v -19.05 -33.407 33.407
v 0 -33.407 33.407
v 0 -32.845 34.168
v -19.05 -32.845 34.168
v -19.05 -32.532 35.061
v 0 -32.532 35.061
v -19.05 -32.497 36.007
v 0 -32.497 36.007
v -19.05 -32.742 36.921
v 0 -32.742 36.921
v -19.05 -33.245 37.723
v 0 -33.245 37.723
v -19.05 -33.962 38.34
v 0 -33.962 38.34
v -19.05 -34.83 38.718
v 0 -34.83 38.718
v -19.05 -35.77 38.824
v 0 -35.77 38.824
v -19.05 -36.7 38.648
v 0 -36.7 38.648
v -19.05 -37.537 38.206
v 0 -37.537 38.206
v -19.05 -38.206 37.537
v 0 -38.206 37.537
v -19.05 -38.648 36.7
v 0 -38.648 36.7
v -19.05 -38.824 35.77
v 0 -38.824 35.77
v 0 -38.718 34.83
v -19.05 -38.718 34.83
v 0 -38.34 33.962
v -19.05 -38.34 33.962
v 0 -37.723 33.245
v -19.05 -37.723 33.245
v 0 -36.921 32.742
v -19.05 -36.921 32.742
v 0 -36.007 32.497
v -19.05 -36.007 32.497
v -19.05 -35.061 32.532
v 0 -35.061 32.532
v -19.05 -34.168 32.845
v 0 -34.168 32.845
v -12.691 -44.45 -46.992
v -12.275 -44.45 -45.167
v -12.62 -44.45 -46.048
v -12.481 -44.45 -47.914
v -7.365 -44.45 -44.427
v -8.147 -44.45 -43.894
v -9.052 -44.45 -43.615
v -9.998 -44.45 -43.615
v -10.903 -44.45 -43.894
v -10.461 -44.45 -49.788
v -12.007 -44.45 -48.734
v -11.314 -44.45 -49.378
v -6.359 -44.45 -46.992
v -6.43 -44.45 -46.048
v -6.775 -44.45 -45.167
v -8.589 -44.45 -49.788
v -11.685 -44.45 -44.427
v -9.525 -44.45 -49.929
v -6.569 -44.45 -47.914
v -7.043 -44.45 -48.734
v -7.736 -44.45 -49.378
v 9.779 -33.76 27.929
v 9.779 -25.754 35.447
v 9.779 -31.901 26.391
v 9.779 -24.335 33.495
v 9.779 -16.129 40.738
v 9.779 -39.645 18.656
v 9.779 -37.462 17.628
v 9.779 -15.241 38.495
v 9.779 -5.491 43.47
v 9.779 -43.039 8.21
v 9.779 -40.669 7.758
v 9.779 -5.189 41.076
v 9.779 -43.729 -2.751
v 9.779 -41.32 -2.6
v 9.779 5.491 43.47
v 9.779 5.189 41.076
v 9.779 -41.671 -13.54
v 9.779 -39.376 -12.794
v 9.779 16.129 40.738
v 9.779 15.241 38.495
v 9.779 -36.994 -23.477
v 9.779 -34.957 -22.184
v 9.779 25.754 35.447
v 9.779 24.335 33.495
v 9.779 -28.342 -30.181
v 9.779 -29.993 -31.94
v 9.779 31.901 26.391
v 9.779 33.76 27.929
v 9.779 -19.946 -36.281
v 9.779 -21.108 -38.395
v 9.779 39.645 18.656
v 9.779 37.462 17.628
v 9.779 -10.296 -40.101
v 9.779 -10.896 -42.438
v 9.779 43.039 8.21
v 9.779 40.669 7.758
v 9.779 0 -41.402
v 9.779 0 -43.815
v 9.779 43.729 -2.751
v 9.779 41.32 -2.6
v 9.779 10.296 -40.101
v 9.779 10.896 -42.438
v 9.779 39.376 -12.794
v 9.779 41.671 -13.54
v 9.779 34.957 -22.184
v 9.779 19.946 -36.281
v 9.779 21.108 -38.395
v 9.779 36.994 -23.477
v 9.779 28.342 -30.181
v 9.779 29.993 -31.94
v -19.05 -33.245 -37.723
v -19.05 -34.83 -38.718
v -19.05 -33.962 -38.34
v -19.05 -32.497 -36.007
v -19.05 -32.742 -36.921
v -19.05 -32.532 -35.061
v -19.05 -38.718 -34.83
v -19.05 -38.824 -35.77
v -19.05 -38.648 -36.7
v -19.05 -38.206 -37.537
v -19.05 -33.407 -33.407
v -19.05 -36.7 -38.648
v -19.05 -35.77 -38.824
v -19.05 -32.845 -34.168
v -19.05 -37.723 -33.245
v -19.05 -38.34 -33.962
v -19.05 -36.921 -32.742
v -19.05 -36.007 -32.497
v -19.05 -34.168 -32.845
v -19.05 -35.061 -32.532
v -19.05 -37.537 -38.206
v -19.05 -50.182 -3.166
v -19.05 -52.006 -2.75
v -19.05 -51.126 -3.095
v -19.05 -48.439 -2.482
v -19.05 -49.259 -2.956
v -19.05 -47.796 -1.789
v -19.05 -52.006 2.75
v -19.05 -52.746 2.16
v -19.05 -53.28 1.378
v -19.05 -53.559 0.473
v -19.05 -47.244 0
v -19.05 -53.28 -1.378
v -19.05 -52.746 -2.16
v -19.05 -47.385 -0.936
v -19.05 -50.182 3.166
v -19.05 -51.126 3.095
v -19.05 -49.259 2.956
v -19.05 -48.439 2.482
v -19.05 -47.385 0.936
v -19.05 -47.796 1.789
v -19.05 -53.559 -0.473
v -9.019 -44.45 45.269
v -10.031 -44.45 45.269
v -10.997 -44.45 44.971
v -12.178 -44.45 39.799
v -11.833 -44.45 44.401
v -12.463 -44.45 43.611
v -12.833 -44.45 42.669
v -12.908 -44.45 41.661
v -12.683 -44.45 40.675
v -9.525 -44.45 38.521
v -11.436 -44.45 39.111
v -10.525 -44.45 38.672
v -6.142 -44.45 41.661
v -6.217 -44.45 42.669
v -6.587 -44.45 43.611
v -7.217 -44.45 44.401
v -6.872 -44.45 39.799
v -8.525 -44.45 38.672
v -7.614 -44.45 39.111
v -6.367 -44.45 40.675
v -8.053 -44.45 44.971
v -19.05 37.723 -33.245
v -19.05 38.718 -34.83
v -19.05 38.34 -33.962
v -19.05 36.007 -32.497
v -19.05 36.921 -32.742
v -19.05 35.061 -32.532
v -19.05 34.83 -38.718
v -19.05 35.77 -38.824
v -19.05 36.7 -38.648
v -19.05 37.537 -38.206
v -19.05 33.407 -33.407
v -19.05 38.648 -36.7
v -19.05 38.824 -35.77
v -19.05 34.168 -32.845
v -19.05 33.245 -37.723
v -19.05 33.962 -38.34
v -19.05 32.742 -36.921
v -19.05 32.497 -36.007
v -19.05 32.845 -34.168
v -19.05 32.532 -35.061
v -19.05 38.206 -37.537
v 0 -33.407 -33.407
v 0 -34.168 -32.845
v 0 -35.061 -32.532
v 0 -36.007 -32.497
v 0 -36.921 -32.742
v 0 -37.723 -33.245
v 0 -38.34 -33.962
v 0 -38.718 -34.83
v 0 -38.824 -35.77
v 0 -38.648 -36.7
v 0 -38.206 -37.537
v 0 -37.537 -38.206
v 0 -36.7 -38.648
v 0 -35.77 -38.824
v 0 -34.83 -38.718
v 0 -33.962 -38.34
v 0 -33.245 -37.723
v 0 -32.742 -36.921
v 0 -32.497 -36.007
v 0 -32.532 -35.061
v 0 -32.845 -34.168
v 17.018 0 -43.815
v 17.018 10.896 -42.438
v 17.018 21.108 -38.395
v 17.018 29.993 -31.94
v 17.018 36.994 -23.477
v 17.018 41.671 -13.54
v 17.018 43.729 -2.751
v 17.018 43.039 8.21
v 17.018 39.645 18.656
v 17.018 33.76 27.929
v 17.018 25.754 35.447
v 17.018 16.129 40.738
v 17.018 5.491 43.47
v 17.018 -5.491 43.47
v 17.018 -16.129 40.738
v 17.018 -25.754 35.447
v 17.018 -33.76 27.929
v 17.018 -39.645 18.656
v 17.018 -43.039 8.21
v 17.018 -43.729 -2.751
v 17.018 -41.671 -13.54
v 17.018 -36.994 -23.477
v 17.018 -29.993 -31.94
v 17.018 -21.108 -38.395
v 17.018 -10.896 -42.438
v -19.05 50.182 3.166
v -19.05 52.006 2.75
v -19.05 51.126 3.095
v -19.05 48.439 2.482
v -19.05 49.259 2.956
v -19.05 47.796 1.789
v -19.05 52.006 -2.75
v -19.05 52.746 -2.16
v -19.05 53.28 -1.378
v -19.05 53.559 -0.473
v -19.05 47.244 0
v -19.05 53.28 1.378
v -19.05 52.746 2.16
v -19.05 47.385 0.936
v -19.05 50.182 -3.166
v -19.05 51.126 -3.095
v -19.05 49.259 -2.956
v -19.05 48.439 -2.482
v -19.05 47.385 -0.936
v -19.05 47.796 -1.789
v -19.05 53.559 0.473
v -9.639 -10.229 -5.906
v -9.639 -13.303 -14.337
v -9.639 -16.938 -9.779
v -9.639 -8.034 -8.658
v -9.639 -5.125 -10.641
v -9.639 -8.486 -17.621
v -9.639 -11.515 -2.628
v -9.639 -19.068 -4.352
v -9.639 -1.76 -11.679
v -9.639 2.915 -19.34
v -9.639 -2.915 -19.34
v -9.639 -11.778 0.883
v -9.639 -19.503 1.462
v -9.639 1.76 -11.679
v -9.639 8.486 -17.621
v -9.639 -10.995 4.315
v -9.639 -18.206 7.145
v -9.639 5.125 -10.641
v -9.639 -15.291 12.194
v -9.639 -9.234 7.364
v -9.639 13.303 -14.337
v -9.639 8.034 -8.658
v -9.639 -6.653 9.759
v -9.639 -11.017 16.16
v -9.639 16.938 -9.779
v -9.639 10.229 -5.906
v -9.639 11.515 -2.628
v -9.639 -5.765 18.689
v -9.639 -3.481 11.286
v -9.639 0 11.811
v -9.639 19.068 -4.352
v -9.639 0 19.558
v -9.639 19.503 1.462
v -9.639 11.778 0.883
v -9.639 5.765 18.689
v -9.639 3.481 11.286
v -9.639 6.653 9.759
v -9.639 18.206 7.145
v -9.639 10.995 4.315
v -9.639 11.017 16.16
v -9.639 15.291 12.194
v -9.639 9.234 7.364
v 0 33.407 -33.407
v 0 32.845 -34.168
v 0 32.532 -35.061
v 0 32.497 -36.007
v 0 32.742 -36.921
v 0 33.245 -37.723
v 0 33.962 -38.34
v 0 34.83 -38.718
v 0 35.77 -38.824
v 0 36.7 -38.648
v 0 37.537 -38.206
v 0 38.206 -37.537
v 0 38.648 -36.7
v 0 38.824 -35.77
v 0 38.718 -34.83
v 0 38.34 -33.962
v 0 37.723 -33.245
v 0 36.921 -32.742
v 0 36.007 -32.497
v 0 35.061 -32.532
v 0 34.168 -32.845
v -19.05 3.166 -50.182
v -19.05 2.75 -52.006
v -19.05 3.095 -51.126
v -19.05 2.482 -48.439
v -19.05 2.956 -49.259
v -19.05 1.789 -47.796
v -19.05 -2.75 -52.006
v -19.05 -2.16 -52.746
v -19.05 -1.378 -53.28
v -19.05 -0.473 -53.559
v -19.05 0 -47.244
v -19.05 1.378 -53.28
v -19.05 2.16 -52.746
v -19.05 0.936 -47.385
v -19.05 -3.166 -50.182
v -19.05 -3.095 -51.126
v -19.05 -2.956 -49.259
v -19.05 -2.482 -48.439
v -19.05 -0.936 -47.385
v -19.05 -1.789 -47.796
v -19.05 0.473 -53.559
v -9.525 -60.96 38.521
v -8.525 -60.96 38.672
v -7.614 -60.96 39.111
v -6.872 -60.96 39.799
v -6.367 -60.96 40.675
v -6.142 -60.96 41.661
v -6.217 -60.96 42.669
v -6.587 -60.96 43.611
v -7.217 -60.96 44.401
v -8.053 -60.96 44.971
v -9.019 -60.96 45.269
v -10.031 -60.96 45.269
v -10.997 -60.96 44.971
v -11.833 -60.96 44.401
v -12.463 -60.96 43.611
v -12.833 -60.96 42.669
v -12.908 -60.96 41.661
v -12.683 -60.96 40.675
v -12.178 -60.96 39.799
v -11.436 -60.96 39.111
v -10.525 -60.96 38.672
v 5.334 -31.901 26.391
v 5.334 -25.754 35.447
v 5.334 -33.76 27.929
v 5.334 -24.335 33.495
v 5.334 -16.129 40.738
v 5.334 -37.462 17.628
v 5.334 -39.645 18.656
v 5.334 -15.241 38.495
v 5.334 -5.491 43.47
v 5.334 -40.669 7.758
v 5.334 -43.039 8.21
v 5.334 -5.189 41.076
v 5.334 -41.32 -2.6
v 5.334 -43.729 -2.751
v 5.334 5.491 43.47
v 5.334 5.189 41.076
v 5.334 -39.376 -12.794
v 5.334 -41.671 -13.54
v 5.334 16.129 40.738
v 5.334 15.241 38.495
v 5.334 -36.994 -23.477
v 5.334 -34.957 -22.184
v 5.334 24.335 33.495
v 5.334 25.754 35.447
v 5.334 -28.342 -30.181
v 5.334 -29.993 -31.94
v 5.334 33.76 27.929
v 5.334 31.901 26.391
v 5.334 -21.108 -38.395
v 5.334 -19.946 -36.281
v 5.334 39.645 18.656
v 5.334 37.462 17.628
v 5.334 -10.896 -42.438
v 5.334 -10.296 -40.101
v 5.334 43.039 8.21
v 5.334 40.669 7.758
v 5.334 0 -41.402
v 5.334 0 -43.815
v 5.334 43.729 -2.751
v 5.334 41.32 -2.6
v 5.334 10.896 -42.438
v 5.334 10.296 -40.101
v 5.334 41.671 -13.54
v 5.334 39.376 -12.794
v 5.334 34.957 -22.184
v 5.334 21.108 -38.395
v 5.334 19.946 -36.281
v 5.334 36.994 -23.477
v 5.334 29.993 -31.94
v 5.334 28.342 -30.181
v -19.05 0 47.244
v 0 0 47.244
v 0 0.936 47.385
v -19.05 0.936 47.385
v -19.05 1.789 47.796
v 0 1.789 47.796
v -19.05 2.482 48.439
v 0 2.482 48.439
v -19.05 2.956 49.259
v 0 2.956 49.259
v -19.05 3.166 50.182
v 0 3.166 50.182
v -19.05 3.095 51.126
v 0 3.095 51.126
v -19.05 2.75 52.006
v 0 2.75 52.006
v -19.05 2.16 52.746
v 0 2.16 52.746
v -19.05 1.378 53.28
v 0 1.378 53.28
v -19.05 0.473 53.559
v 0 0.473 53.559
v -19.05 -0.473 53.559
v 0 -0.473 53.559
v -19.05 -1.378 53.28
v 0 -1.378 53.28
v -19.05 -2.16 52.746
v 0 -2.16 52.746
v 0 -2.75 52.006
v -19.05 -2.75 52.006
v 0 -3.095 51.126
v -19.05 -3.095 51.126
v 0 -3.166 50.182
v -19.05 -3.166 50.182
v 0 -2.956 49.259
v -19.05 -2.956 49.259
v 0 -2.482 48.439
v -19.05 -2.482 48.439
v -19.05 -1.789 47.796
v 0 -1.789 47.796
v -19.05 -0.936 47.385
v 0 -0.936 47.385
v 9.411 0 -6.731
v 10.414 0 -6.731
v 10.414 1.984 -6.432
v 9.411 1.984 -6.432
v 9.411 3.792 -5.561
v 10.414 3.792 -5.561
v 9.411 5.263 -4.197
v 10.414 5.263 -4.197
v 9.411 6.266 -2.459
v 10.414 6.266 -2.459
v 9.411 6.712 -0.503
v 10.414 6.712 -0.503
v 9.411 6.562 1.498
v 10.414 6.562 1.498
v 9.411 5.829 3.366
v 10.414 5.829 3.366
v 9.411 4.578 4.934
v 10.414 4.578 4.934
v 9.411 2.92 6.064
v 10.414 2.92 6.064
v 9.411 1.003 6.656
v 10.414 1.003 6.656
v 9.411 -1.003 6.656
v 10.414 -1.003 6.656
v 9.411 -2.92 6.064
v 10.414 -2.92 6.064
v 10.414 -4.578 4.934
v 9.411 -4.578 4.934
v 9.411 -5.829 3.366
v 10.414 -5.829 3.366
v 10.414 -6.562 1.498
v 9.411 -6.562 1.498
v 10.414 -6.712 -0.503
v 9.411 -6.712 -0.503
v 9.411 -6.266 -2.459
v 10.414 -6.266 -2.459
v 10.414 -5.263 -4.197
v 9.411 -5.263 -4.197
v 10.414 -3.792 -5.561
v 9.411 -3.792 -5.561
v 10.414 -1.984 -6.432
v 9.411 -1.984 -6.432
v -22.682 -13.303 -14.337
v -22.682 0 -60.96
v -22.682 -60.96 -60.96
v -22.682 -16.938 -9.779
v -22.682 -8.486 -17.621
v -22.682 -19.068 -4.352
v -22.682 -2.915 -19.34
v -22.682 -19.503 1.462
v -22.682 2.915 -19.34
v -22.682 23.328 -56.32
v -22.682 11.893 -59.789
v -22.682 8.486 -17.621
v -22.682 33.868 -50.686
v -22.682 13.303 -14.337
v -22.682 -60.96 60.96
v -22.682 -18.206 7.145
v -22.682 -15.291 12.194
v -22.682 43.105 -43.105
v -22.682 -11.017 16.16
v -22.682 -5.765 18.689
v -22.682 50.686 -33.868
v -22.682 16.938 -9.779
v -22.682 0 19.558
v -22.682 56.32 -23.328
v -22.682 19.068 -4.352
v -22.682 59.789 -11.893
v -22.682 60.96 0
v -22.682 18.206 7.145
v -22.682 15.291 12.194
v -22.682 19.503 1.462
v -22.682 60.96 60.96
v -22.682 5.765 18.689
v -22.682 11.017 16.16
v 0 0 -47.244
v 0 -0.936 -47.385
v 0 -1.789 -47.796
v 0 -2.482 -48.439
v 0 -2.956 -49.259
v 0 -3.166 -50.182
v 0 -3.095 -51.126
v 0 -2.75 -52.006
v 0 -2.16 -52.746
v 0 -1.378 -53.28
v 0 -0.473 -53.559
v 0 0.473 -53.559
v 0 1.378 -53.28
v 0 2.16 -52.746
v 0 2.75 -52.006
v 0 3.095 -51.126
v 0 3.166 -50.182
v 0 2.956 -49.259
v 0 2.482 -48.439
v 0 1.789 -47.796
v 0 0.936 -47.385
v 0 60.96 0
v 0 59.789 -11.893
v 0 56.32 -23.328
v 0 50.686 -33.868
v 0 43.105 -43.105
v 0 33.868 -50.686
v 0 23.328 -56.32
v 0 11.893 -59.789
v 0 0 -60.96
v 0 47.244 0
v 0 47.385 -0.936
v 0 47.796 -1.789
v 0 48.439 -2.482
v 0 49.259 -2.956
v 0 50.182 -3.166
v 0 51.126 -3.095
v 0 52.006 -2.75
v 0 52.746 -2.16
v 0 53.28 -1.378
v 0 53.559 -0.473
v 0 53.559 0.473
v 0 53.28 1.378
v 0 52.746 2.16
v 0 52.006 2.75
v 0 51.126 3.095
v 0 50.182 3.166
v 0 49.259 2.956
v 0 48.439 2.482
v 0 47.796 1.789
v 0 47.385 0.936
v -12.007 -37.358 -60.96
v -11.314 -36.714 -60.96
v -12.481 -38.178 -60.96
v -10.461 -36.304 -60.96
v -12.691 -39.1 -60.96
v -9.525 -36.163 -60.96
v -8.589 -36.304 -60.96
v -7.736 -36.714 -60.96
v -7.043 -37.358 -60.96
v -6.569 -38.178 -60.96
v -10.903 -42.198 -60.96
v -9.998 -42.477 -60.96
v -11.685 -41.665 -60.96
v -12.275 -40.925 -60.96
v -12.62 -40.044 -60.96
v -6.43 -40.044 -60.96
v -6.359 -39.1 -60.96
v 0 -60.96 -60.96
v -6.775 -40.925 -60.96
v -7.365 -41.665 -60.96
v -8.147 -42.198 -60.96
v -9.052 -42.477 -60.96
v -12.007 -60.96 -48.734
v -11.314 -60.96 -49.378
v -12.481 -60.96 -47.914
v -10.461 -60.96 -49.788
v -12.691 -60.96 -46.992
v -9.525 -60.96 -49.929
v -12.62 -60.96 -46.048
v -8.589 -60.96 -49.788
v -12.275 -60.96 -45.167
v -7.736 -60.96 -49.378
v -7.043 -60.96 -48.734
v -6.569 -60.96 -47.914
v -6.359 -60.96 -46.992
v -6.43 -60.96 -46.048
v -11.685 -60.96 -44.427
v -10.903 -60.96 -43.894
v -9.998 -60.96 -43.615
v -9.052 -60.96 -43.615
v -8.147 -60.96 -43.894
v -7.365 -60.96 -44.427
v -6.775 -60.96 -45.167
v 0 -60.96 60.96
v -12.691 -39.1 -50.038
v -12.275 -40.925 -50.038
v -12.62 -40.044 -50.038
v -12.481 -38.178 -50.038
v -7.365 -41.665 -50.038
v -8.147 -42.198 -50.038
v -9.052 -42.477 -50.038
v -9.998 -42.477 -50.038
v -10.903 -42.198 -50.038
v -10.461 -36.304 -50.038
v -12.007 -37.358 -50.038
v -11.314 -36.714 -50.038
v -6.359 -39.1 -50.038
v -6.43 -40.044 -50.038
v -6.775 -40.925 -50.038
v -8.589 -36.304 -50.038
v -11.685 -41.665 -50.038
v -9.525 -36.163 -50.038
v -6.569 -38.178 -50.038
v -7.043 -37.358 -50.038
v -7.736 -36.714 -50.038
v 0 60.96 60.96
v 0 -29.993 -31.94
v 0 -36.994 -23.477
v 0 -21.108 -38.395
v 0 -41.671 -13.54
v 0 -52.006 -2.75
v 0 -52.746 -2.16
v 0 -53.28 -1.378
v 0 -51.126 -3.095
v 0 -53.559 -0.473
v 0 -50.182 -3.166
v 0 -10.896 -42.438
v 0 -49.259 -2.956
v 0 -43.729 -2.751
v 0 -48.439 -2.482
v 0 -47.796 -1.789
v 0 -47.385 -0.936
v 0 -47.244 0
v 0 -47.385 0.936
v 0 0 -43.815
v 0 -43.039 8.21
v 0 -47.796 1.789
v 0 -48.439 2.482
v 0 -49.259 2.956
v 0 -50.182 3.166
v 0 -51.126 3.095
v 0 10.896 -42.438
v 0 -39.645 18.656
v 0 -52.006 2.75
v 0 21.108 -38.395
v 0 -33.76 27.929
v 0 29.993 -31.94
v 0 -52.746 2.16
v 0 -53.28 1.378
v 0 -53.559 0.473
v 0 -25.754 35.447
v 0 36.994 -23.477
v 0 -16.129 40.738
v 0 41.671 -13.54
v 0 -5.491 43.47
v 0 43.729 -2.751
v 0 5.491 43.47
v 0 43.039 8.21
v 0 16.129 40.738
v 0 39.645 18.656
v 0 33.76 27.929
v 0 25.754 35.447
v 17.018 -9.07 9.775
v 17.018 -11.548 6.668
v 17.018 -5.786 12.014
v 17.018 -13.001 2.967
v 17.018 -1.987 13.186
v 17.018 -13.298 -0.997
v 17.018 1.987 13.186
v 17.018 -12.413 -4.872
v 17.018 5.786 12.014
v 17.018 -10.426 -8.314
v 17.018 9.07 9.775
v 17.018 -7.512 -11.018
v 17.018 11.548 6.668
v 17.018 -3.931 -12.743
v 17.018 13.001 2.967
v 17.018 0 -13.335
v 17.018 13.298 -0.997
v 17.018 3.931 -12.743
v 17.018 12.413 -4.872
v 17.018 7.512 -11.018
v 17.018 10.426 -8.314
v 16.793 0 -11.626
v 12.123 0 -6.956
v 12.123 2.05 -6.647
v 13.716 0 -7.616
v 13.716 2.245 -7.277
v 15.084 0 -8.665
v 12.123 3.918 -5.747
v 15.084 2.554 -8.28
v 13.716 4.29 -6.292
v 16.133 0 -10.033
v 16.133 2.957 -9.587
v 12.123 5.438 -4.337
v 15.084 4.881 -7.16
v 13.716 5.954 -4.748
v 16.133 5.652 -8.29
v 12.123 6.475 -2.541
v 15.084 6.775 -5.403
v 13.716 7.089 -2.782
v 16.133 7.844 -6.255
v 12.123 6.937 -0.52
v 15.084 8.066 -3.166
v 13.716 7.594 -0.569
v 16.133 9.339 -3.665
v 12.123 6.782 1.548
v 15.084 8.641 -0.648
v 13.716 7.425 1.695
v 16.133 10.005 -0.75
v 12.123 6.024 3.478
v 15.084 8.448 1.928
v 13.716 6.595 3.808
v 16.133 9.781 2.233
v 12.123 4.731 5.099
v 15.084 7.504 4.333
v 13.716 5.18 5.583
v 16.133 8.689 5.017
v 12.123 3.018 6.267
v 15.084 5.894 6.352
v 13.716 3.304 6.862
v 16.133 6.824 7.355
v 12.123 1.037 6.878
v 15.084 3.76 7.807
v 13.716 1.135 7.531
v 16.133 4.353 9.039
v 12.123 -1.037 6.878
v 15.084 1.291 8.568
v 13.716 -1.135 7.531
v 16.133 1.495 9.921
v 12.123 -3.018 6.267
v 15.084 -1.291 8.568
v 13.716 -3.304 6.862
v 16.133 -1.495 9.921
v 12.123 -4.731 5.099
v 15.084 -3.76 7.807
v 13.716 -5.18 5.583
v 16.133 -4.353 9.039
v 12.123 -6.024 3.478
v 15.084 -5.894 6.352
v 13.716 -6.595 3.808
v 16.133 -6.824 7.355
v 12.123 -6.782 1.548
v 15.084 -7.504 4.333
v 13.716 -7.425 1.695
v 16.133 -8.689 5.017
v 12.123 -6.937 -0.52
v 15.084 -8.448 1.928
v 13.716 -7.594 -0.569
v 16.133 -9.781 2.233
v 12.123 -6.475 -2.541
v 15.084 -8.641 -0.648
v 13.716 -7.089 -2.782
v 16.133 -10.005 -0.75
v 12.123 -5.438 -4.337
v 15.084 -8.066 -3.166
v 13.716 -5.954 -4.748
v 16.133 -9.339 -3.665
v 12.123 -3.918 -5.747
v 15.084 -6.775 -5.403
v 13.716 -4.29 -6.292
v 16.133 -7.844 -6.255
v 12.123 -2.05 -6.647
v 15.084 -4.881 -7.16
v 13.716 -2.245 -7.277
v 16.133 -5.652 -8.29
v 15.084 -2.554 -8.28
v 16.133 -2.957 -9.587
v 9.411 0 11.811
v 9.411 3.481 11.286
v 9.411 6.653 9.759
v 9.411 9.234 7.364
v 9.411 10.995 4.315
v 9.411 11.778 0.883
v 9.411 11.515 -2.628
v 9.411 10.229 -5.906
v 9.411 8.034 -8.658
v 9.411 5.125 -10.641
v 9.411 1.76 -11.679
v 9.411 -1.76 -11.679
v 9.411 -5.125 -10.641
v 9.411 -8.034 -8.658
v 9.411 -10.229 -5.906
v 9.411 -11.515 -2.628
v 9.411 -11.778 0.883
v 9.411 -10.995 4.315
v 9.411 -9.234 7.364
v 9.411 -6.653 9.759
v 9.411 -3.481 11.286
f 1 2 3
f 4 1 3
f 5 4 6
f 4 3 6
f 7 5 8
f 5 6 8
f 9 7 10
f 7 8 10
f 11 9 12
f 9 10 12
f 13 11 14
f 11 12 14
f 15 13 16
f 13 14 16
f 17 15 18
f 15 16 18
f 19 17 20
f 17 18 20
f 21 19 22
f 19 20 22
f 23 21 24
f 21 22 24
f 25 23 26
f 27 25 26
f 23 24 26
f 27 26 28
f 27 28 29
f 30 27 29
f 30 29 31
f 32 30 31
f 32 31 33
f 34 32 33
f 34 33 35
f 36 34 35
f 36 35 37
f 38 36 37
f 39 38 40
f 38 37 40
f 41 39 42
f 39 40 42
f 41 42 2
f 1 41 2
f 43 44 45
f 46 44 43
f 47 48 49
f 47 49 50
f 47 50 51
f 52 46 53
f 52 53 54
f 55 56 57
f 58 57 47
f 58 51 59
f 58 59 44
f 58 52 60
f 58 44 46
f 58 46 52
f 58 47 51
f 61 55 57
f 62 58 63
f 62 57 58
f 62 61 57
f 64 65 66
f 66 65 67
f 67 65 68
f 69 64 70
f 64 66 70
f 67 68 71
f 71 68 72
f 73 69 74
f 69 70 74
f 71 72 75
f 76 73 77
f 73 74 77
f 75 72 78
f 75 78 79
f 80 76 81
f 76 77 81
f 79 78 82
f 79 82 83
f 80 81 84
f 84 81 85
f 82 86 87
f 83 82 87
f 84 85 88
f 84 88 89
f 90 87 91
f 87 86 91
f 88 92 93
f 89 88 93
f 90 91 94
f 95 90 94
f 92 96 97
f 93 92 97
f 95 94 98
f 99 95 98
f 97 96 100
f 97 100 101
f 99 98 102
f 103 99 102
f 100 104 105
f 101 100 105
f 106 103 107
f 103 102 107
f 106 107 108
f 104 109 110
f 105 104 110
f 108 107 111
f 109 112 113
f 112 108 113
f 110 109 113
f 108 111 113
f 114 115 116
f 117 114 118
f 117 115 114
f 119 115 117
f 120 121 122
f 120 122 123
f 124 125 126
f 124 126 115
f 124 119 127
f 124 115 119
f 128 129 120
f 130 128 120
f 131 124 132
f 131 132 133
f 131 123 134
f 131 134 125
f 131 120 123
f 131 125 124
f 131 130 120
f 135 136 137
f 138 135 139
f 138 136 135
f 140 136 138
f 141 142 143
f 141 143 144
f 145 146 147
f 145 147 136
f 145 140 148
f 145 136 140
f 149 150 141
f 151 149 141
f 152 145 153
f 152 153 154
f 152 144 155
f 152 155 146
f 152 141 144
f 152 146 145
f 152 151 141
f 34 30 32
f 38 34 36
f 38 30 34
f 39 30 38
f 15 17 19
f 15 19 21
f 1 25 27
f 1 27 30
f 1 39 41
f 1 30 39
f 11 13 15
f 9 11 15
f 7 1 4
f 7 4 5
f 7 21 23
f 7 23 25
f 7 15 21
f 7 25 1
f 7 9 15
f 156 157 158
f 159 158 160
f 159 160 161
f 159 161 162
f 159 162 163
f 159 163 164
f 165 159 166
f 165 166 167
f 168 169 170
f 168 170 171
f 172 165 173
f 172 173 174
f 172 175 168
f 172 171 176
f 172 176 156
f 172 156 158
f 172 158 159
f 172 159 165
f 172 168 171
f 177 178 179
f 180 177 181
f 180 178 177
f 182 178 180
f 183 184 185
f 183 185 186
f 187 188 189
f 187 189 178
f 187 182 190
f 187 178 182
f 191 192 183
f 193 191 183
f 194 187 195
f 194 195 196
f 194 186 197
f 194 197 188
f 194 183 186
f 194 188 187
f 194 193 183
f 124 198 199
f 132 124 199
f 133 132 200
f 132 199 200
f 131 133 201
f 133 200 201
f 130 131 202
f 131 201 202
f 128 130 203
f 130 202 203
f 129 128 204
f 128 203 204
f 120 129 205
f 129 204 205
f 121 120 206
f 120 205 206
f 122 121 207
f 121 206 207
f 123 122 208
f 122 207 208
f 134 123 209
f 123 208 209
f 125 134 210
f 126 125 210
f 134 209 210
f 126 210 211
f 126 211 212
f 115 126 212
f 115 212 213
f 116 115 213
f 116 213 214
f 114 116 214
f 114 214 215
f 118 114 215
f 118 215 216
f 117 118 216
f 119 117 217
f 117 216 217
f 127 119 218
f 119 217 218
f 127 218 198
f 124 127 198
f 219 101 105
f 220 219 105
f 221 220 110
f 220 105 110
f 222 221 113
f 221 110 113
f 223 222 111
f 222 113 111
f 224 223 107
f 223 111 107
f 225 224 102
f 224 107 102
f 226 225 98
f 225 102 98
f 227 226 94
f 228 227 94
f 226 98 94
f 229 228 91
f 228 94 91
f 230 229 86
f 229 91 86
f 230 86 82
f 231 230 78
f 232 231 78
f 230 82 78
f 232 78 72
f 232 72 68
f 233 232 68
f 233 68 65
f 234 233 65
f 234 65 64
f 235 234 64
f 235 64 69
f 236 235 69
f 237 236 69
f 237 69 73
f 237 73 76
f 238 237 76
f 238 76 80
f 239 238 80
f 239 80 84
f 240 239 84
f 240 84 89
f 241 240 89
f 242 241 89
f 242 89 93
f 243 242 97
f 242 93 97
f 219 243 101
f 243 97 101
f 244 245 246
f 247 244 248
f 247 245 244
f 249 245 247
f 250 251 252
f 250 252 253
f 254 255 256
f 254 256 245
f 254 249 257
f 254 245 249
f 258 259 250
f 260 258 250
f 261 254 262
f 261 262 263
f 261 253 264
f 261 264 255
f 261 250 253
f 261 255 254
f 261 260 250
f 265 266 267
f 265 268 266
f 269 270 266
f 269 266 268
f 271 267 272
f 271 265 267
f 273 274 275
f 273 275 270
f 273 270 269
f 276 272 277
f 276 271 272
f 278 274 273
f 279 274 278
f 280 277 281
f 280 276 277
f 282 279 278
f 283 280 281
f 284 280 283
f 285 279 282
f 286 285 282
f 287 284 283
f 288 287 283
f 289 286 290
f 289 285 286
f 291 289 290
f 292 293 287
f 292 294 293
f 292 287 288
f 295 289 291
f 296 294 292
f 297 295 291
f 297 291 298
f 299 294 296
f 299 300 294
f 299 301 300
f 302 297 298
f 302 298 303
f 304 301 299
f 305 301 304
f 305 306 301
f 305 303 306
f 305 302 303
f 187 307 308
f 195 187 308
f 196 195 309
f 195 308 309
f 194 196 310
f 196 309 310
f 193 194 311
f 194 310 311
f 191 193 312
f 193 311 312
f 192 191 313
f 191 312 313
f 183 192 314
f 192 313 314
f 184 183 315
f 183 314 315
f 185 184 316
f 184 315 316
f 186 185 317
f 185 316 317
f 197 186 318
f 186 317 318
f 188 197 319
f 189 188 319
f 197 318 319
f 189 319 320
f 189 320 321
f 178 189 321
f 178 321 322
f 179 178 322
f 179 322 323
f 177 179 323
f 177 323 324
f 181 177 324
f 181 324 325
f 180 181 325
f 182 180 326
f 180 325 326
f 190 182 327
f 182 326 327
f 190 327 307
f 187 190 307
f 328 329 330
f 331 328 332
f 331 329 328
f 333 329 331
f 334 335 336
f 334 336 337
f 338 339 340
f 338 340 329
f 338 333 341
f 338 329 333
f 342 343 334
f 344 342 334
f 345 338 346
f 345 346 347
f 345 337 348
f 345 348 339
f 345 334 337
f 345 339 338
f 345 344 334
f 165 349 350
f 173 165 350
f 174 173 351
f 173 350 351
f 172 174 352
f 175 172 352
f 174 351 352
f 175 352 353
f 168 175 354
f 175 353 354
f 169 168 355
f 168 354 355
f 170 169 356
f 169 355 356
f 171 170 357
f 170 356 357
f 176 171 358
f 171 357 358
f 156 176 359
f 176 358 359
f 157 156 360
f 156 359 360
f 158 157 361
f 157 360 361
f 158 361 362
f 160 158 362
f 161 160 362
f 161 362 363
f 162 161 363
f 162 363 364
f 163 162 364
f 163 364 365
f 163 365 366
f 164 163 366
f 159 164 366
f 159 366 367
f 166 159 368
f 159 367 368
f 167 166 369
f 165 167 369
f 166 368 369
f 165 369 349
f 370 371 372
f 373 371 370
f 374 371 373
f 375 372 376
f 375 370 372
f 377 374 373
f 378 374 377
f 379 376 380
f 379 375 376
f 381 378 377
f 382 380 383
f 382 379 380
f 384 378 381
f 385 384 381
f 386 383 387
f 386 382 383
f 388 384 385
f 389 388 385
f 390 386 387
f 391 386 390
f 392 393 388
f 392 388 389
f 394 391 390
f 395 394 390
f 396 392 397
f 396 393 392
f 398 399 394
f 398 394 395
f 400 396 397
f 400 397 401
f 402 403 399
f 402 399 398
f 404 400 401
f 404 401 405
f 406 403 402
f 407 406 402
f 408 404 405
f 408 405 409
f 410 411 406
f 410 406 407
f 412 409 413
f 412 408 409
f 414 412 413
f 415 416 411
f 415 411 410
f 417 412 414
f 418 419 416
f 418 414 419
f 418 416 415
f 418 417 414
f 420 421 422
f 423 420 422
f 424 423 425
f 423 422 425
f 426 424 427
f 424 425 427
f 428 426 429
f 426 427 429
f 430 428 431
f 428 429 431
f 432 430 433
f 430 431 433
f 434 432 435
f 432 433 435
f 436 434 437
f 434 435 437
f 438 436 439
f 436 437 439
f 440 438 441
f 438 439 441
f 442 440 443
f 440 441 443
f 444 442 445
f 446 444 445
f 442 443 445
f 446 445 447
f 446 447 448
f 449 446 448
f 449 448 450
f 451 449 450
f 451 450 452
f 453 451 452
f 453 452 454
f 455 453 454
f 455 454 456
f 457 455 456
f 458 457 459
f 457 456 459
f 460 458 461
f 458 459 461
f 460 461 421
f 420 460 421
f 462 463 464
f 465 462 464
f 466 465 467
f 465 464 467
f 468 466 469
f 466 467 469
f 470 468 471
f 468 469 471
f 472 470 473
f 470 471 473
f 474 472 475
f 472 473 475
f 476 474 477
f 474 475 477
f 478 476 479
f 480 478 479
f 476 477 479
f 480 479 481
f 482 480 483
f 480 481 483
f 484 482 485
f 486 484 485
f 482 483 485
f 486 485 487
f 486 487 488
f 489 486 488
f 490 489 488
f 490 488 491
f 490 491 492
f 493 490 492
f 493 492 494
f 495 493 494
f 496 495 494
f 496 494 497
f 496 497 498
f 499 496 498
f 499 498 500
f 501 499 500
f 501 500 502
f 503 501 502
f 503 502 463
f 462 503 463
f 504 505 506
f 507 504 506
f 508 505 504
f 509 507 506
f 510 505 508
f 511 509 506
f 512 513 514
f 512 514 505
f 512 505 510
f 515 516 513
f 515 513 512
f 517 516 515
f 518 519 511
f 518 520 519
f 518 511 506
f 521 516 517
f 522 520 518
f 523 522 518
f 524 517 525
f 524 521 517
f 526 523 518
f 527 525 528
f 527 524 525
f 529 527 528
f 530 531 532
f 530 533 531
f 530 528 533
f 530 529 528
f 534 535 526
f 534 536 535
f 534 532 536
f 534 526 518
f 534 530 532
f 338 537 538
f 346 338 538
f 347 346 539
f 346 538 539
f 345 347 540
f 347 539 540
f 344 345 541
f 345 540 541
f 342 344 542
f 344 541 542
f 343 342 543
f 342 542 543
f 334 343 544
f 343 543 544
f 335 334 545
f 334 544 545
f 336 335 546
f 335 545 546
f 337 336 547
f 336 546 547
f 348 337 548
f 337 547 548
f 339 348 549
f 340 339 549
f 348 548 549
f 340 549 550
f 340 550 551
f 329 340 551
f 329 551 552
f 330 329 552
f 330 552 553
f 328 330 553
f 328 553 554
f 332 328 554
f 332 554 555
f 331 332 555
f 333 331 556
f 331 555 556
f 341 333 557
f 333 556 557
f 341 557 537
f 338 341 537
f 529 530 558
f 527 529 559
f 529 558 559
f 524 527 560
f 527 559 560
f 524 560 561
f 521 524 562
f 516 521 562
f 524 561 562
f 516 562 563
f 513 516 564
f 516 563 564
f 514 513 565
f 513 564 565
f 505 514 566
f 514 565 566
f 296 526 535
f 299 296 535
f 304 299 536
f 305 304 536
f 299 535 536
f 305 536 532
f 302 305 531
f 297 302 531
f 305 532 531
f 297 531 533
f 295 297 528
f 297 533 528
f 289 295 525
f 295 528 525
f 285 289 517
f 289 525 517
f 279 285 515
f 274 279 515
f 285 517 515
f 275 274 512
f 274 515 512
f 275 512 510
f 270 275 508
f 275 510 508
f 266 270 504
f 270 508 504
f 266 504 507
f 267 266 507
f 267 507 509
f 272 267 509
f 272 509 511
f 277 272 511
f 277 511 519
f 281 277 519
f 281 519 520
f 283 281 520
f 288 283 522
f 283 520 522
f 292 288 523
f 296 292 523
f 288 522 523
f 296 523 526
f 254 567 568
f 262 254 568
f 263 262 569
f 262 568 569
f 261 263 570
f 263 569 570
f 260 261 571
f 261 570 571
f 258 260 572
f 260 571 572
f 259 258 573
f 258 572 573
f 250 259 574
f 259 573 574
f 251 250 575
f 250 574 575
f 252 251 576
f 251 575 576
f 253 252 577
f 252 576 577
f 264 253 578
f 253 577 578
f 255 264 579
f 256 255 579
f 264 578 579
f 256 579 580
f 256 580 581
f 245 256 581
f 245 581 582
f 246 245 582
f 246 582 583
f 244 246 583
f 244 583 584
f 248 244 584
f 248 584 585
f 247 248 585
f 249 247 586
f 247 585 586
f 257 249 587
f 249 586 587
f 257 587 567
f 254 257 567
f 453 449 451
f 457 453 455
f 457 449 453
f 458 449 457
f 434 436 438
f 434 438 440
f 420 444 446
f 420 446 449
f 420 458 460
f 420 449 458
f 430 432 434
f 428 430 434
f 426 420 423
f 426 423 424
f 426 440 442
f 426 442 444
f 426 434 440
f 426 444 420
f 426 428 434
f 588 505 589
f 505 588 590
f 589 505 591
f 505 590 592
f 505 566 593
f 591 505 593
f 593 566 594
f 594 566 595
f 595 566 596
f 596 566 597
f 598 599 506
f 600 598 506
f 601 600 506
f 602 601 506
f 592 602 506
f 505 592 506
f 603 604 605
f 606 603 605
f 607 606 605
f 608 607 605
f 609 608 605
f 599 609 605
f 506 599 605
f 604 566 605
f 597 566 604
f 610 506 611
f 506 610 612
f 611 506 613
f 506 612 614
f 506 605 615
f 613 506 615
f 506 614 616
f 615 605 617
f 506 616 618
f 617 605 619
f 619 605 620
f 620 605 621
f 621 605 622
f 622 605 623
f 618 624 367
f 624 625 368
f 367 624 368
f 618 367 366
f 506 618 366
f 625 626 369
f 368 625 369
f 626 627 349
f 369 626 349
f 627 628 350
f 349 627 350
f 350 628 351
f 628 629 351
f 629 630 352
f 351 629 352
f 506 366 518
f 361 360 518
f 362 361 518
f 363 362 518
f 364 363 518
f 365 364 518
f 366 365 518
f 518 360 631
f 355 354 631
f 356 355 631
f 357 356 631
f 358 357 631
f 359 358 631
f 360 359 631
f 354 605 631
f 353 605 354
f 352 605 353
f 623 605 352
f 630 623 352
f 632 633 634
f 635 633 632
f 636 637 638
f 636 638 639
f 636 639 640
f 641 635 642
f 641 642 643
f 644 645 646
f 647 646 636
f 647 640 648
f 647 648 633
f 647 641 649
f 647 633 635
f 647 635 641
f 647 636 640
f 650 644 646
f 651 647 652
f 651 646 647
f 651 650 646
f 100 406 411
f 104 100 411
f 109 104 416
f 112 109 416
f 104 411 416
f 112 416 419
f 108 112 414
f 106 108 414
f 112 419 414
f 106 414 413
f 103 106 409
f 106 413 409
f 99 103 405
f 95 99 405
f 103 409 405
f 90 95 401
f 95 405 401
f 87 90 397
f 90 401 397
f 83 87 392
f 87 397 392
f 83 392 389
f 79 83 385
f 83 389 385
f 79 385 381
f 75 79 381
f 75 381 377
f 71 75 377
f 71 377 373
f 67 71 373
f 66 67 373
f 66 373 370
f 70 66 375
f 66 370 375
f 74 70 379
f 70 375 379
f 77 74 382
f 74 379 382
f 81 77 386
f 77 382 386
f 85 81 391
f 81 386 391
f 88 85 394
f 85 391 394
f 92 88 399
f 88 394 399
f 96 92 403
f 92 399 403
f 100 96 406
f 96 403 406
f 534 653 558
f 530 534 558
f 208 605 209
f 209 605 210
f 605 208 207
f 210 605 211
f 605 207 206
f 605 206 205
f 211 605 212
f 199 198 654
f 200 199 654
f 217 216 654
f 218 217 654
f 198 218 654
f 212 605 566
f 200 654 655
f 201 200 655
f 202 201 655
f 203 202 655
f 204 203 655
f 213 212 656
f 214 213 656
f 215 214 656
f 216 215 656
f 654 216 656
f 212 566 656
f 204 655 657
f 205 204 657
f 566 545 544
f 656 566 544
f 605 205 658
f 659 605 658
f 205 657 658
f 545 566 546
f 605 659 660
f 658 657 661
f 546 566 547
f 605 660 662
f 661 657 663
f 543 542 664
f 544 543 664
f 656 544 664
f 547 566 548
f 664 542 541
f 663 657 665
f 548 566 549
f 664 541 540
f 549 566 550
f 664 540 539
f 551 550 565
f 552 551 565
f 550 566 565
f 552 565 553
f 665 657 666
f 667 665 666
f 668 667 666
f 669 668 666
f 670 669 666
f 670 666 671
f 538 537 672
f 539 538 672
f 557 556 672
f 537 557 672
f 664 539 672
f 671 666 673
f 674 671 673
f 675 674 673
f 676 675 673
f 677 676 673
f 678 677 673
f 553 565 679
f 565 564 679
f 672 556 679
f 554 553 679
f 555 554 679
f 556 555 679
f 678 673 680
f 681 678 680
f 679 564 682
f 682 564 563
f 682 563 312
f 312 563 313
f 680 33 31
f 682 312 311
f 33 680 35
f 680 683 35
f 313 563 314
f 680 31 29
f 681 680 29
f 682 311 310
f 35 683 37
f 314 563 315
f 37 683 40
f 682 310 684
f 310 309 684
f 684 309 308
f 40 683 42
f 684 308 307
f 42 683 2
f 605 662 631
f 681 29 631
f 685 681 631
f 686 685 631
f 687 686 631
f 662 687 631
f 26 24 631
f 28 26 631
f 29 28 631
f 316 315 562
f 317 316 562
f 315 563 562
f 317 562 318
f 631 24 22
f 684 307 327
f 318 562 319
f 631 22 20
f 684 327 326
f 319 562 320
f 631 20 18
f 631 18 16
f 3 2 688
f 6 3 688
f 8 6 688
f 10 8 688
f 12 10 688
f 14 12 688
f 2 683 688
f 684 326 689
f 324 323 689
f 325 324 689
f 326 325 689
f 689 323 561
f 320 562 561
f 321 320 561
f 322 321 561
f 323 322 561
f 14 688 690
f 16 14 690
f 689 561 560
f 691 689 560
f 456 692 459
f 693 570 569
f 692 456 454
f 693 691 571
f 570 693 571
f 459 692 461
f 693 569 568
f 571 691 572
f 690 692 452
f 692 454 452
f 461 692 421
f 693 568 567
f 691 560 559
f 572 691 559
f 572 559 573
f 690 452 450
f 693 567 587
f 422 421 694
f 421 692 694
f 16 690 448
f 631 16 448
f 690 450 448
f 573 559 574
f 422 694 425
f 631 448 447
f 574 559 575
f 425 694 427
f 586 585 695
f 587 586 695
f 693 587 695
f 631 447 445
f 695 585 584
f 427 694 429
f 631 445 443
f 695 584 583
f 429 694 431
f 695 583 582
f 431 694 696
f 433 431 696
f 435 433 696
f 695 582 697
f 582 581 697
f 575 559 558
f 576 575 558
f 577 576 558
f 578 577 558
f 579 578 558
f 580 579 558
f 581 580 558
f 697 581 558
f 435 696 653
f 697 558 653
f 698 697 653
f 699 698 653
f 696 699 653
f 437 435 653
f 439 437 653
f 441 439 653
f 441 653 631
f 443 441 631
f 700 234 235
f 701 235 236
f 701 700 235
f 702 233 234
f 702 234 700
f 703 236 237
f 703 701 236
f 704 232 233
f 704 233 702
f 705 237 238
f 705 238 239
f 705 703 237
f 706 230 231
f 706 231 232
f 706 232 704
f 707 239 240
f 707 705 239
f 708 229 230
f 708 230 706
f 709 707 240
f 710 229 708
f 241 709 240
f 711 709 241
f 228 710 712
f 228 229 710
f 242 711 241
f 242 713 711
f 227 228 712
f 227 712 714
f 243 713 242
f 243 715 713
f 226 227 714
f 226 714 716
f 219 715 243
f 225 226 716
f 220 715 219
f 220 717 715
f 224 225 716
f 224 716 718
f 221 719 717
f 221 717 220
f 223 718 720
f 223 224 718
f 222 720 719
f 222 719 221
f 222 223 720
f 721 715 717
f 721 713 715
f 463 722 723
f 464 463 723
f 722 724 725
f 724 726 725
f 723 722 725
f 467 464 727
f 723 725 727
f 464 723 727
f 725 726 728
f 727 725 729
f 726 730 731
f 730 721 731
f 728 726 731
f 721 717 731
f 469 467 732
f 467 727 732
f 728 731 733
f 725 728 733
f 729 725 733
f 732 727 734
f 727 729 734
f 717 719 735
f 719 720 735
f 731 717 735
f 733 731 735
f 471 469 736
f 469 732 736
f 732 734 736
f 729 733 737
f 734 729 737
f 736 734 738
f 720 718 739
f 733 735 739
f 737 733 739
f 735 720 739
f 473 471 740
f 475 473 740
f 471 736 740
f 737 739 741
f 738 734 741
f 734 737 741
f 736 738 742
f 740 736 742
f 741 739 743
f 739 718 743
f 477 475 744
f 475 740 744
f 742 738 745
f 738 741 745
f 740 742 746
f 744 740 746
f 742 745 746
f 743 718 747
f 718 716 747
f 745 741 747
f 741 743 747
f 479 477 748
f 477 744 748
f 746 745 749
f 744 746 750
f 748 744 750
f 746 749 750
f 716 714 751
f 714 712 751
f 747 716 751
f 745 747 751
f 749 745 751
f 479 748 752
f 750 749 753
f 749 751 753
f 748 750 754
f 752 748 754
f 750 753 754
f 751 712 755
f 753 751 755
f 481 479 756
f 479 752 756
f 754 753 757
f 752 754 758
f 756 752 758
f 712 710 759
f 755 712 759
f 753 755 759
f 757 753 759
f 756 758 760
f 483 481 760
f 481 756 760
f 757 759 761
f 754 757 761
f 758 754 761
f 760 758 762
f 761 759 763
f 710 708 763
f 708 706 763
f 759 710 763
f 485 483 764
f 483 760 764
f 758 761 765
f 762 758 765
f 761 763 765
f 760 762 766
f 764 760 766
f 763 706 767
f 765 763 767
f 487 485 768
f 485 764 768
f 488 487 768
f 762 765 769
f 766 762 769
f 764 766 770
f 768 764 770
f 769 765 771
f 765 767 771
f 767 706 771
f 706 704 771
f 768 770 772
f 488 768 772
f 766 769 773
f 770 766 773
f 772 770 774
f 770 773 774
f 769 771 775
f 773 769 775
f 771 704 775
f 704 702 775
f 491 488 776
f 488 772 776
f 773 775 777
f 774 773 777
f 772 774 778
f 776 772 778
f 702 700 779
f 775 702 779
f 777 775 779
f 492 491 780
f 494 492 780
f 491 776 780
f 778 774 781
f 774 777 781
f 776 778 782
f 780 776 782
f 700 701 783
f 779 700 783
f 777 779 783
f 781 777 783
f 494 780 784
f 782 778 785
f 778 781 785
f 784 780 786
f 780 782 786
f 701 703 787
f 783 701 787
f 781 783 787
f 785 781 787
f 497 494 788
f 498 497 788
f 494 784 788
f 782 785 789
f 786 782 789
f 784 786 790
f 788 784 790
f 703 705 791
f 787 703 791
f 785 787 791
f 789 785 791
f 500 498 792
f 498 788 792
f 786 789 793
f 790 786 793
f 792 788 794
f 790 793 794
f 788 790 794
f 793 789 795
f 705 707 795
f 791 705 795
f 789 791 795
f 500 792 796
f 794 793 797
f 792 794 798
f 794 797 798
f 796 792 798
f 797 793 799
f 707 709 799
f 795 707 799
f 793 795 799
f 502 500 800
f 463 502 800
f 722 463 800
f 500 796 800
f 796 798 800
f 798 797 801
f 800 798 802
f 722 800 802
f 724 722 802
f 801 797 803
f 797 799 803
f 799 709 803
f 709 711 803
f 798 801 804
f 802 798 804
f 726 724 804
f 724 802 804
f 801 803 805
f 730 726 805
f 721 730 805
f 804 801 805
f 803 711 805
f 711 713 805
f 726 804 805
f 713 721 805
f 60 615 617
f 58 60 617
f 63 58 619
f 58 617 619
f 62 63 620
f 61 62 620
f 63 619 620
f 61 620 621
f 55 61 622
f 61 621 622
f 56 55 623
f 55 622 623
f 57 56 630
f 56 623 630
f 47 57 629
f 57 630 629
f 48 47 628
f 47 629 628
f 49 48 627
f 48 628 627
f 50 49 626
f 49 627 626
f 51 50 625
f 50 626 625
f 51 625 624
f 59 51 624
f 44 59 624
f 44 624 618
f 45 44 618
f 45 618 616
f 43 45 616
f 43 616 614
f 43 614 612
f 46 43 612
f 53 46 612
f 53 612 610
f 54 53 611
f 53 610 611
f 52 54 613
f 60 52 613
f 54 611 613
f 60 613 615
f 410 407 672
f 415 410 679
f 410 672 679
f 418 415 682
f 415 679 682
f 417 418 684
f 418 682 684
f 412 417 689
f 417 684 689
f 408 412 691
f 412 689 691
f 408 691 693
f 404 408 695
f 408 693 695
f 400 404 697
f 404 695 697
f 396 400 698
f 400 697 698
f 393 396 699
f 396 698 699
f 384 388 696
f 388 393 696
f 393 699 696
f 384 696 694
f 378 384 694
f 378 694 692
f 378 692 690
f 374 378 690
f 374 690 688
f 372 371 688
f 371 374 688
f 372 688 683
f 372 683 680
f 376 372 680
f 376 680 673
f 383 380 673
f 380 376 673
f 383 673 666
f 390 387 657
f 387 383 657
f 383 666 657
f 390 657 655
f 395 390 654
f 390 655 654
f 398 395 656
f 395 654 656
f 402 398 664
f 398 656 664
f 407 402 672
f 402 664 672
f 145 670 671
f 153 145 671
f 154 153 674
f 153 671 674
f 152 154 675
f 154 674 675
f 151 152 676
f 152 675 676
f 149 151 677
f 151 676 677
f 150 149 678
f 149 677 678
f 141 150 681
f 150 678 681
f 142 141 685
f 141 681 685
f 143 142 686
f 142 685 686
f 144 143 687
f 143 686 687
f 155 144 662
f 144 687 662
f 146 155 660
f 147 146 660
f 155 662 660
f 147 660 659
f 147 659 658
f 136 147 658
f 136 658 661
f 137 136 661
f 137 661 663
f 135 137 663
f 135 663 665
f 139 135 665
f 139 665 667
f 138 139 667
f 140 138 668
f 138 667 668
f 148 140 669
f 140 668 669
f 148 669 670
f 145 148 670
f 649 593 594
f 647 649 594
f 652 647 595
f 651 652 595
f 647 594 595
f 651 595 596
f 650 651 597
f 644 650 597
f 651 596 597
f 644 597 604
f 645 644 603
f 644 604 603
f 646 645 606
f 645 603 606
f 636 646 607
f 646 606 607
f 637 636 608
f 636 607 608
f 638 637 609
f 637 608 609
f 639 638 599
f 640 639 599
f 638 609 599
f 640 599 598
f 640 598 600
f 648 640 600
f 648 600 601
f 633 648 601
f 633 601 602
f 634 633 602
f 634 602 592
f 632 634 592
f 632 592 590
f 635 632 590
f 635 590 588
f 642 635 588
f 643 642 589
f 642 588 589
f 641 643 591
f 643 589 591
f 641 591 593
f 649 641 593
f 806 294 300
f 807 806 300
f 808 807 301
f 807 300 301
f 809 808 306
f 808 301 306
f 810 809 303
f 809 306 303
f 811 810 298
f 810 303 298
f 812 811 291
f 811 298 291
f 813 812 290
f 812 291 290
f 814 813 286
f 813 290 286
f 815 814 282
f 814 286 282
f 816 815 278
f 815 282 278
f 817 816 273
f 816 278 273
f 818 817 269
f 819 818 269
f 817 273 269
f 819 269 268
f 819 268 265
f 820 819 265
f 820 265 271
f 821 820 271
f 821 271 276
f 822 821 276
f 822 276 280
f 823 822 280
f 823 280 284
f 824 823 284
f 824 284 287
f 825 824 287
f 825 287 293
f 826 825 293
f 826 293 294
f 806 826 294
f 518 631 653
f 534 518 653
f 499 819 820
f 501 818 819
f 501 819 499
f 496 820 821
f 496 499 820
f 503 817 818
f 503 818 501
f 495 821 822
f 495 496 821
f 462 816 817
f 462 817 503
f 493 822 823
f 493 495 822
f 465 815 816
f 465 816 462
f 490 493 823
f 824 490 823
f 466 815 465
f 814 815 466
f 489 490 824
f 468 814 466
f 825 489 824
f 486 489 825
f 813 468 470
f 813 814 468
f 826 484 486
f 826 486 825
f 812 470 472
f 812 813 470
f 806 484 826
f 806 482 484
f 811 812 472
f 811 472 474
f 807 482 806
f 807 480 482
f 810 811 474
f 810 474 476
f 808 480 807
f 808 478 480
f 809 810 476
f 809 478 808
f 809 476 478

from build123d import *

# Parameters (mm, degrees)
SKETCH1_R                     = 43.815
HOUSING_FITTING_EXTRUDE_DEPTH = 17.018
HOUSING_BODY_1_DEPTH          = 22.6822
SKETCH3_R                     = 6.731
IMPELLER_BORE_DEPTH           = 17.018
SKETCH4_R                     = 4
SHAFT_BORE_DEPTH              = 70.612
O_RING_CUT_DEPTH              = 1.27
O_RING_CUT_DEPTH_BACK         = 3.175
SKETCH5_R                     = 43.942
SKETCH5_R_2                   = 41.402
SKETCH12_R                    = 3.175
CUT_EXTRUDE2_DEPTH            = 19.05
CIRPATTERN1_COUNT             = 8
SKETCH14_R                    = 3.175
SKETCH14_R_2                  = 3.392842108
CUT_EXTRUDE4_DEPTH            = 16.51
SKETCH15_R                    = 3.175
CUT_EXTRUDE5_DEPTH            = 10.922
FILLET1_R                     = 6.604
SKETCH16_R                    = 11.811
CUT_EXTRUDE7_DEPTH            = 32.0929
SKETCH17_R                    = 19.558
CUT_EXTRUDE8_DEPTH            = 13.0429


with BuildPart() as part:
    # Sketch1 → Housing Fitting Extrude (new body)
    with BuildSketch(Plane(origin=(0, 0, 0), x_dir=(0, 0, -1), z_dir=(1, 0, 0))):
        Circle(SKETCH1_R)
    extrude(amount=HOUSING_FITTING_EXTRUDE_DEPTH)

    # Sketch2 → Housing Body 1 (add)
    with BuildSketch(Plane.ZY):
        with BuildLine():
            Line((60.96, 0), (60.96, 60.96))
            Line((60.96, 60.96), (0, 60.96))
            ThreePointArc((0, 60.96), (-43.105229381, 43.105229381), (-60.96, 0))
            Line((-60.96, 0), (-60.96, -54.61))
            Line((-60.96, -54.61), (-60.96, -60.96))
            Line((-60.96, -60.96), (60.96, -60.96))
            Line((60.96, -60.96), (60.96, -54.61))
            Line((60.96, -54.61), (60.96, 0))
        make_face()
    extrude(amount=HOUSING_BODY_1_DEPTH)

    # Sketch3 → Impeller Bore (cut)
    with BuildSketch(Plane(origin=(17.018, 0, 0), x_dir=(0, 0, -1), z_dir=(1, 0, 0))):
        Circle(SKETCH3_R)
    extrude(amount=-IMPELLER_BORE_DEPTH, mode=Mode.SUBTRACT)

    # Sketch4 → Shaft Bore (cut)
    with BuildSketch(Plane(origin=(0, 0, 0), x_dir=(0, 0, -1), z_dir=(1, 0, 0))):
        Circle(SKETCH4_R)
    extrude(amount=-SHAFT_BORE_DEPTH, mode=Mode.SUBTRACT)

    # Sketch5 → O-Ring Cut (cut, two sides: drawn at the far end of the back side and taken through both)
    with BuildSketch(Plane(origin=(8.509, 0, 0), x_dir=(0, 0, -1), z_dir=(1, 0, 0)).offset(-O_RING_CUT_DEPTH_BACK)):
        Circle(SKETCH5_R)
        Circle(SKETCH5_R_2, mode=Mode.SUBTRACT)
    extrude(amount=O_RING_CUT_DEPTH + O_RING_CUT_DEPTH_BACK, mode=Mode.SUBTRACT)

    # Sketch12 → Cut-Extrude2 (cut)
    with BuildSketch(Plane(origin=(0, 0, 0), x_dir=(0, 0, -1), z_dir=(1, 0, 0))):
        with Locations((-50.419, 0)):
            Circle(SKETCH12_R)
    cut_extrude2 = extrude(amount=-CUT_EXTRUDE2_DEPTH, mode=Mode.SUBTRACT)

    # CirPattern1: Cut-Extrude2 ×8 about axis, 1 skipped
    cirpattern1_axis = Axis((0, 0, 0), (1, 0, 0))
    add([cut_extrude2.rotate(cirpattern1_axis, i * 360 / CIRPATTERN1_COUNT) for i in range(1, CIRPATTERN1_COUNT) if i not in (7,)], mode=Mode.SUBTRACT)

    # Sketch14 → Cut-Extrude4 (cut)
    with BuildSketch(Plane.XZ.offset(60.96)):
        with Locations(Location((-9.525, -46.754349092, 0), (0, 0, 270))):
            Circle(SKETCH14_R)
        with Locations(Location((-9.525, 41.914080666, 0), (0, 0, 270))):
            Circle(SKETCH14_R_2)
    extrude(amount=-CUT_EXTRUDE4_DEPTH, mode=Mode.SUBTRACT)

    # Sketch15 → Cut-Extrude5 (cut)
    with BuildSketch(Plane(origin=(0, 0, -60.96), x_dir=(-1, 0, 0), z_dir=(0, 0, -1))):
        with Locations(Location((9.525, -39.337514031, 0), (0, 0, 90))):
            Circle(SKETCH15_R)
    extrude(amount=-CUT_EXTRUDE5_DEPTH, mode=Mode.SUBTRACT)

    # Fillet1
    fillet1_edges = [part.edges().sort_by_distance(p)[0] for p in [
        (17.018, 0, 6.731),
    ]]
    fillet(fillet1_edges, radius=FILLET1_R)

    # Sketch16 → Cut-Extrude7 (cut)
    with BuildSketch(Plane.ZY.offset(22.6822)):
        Circle(SKETCH16_R)
    extrude(amount=-CUT_EXTRUDE7_DEPTH, mode=Mode.SUBTRACT)

    # Sketch17 → Cut-Extrude8 (cut)
    with BuildSketch(Plane.ZY.offset(22.6822)):
        Circle(SKETCH17_R)
    extrude(amount=-CUT_EXTRUDE8_DEPTH, mode=Mode.SUBTRACT)


solid = part.part
